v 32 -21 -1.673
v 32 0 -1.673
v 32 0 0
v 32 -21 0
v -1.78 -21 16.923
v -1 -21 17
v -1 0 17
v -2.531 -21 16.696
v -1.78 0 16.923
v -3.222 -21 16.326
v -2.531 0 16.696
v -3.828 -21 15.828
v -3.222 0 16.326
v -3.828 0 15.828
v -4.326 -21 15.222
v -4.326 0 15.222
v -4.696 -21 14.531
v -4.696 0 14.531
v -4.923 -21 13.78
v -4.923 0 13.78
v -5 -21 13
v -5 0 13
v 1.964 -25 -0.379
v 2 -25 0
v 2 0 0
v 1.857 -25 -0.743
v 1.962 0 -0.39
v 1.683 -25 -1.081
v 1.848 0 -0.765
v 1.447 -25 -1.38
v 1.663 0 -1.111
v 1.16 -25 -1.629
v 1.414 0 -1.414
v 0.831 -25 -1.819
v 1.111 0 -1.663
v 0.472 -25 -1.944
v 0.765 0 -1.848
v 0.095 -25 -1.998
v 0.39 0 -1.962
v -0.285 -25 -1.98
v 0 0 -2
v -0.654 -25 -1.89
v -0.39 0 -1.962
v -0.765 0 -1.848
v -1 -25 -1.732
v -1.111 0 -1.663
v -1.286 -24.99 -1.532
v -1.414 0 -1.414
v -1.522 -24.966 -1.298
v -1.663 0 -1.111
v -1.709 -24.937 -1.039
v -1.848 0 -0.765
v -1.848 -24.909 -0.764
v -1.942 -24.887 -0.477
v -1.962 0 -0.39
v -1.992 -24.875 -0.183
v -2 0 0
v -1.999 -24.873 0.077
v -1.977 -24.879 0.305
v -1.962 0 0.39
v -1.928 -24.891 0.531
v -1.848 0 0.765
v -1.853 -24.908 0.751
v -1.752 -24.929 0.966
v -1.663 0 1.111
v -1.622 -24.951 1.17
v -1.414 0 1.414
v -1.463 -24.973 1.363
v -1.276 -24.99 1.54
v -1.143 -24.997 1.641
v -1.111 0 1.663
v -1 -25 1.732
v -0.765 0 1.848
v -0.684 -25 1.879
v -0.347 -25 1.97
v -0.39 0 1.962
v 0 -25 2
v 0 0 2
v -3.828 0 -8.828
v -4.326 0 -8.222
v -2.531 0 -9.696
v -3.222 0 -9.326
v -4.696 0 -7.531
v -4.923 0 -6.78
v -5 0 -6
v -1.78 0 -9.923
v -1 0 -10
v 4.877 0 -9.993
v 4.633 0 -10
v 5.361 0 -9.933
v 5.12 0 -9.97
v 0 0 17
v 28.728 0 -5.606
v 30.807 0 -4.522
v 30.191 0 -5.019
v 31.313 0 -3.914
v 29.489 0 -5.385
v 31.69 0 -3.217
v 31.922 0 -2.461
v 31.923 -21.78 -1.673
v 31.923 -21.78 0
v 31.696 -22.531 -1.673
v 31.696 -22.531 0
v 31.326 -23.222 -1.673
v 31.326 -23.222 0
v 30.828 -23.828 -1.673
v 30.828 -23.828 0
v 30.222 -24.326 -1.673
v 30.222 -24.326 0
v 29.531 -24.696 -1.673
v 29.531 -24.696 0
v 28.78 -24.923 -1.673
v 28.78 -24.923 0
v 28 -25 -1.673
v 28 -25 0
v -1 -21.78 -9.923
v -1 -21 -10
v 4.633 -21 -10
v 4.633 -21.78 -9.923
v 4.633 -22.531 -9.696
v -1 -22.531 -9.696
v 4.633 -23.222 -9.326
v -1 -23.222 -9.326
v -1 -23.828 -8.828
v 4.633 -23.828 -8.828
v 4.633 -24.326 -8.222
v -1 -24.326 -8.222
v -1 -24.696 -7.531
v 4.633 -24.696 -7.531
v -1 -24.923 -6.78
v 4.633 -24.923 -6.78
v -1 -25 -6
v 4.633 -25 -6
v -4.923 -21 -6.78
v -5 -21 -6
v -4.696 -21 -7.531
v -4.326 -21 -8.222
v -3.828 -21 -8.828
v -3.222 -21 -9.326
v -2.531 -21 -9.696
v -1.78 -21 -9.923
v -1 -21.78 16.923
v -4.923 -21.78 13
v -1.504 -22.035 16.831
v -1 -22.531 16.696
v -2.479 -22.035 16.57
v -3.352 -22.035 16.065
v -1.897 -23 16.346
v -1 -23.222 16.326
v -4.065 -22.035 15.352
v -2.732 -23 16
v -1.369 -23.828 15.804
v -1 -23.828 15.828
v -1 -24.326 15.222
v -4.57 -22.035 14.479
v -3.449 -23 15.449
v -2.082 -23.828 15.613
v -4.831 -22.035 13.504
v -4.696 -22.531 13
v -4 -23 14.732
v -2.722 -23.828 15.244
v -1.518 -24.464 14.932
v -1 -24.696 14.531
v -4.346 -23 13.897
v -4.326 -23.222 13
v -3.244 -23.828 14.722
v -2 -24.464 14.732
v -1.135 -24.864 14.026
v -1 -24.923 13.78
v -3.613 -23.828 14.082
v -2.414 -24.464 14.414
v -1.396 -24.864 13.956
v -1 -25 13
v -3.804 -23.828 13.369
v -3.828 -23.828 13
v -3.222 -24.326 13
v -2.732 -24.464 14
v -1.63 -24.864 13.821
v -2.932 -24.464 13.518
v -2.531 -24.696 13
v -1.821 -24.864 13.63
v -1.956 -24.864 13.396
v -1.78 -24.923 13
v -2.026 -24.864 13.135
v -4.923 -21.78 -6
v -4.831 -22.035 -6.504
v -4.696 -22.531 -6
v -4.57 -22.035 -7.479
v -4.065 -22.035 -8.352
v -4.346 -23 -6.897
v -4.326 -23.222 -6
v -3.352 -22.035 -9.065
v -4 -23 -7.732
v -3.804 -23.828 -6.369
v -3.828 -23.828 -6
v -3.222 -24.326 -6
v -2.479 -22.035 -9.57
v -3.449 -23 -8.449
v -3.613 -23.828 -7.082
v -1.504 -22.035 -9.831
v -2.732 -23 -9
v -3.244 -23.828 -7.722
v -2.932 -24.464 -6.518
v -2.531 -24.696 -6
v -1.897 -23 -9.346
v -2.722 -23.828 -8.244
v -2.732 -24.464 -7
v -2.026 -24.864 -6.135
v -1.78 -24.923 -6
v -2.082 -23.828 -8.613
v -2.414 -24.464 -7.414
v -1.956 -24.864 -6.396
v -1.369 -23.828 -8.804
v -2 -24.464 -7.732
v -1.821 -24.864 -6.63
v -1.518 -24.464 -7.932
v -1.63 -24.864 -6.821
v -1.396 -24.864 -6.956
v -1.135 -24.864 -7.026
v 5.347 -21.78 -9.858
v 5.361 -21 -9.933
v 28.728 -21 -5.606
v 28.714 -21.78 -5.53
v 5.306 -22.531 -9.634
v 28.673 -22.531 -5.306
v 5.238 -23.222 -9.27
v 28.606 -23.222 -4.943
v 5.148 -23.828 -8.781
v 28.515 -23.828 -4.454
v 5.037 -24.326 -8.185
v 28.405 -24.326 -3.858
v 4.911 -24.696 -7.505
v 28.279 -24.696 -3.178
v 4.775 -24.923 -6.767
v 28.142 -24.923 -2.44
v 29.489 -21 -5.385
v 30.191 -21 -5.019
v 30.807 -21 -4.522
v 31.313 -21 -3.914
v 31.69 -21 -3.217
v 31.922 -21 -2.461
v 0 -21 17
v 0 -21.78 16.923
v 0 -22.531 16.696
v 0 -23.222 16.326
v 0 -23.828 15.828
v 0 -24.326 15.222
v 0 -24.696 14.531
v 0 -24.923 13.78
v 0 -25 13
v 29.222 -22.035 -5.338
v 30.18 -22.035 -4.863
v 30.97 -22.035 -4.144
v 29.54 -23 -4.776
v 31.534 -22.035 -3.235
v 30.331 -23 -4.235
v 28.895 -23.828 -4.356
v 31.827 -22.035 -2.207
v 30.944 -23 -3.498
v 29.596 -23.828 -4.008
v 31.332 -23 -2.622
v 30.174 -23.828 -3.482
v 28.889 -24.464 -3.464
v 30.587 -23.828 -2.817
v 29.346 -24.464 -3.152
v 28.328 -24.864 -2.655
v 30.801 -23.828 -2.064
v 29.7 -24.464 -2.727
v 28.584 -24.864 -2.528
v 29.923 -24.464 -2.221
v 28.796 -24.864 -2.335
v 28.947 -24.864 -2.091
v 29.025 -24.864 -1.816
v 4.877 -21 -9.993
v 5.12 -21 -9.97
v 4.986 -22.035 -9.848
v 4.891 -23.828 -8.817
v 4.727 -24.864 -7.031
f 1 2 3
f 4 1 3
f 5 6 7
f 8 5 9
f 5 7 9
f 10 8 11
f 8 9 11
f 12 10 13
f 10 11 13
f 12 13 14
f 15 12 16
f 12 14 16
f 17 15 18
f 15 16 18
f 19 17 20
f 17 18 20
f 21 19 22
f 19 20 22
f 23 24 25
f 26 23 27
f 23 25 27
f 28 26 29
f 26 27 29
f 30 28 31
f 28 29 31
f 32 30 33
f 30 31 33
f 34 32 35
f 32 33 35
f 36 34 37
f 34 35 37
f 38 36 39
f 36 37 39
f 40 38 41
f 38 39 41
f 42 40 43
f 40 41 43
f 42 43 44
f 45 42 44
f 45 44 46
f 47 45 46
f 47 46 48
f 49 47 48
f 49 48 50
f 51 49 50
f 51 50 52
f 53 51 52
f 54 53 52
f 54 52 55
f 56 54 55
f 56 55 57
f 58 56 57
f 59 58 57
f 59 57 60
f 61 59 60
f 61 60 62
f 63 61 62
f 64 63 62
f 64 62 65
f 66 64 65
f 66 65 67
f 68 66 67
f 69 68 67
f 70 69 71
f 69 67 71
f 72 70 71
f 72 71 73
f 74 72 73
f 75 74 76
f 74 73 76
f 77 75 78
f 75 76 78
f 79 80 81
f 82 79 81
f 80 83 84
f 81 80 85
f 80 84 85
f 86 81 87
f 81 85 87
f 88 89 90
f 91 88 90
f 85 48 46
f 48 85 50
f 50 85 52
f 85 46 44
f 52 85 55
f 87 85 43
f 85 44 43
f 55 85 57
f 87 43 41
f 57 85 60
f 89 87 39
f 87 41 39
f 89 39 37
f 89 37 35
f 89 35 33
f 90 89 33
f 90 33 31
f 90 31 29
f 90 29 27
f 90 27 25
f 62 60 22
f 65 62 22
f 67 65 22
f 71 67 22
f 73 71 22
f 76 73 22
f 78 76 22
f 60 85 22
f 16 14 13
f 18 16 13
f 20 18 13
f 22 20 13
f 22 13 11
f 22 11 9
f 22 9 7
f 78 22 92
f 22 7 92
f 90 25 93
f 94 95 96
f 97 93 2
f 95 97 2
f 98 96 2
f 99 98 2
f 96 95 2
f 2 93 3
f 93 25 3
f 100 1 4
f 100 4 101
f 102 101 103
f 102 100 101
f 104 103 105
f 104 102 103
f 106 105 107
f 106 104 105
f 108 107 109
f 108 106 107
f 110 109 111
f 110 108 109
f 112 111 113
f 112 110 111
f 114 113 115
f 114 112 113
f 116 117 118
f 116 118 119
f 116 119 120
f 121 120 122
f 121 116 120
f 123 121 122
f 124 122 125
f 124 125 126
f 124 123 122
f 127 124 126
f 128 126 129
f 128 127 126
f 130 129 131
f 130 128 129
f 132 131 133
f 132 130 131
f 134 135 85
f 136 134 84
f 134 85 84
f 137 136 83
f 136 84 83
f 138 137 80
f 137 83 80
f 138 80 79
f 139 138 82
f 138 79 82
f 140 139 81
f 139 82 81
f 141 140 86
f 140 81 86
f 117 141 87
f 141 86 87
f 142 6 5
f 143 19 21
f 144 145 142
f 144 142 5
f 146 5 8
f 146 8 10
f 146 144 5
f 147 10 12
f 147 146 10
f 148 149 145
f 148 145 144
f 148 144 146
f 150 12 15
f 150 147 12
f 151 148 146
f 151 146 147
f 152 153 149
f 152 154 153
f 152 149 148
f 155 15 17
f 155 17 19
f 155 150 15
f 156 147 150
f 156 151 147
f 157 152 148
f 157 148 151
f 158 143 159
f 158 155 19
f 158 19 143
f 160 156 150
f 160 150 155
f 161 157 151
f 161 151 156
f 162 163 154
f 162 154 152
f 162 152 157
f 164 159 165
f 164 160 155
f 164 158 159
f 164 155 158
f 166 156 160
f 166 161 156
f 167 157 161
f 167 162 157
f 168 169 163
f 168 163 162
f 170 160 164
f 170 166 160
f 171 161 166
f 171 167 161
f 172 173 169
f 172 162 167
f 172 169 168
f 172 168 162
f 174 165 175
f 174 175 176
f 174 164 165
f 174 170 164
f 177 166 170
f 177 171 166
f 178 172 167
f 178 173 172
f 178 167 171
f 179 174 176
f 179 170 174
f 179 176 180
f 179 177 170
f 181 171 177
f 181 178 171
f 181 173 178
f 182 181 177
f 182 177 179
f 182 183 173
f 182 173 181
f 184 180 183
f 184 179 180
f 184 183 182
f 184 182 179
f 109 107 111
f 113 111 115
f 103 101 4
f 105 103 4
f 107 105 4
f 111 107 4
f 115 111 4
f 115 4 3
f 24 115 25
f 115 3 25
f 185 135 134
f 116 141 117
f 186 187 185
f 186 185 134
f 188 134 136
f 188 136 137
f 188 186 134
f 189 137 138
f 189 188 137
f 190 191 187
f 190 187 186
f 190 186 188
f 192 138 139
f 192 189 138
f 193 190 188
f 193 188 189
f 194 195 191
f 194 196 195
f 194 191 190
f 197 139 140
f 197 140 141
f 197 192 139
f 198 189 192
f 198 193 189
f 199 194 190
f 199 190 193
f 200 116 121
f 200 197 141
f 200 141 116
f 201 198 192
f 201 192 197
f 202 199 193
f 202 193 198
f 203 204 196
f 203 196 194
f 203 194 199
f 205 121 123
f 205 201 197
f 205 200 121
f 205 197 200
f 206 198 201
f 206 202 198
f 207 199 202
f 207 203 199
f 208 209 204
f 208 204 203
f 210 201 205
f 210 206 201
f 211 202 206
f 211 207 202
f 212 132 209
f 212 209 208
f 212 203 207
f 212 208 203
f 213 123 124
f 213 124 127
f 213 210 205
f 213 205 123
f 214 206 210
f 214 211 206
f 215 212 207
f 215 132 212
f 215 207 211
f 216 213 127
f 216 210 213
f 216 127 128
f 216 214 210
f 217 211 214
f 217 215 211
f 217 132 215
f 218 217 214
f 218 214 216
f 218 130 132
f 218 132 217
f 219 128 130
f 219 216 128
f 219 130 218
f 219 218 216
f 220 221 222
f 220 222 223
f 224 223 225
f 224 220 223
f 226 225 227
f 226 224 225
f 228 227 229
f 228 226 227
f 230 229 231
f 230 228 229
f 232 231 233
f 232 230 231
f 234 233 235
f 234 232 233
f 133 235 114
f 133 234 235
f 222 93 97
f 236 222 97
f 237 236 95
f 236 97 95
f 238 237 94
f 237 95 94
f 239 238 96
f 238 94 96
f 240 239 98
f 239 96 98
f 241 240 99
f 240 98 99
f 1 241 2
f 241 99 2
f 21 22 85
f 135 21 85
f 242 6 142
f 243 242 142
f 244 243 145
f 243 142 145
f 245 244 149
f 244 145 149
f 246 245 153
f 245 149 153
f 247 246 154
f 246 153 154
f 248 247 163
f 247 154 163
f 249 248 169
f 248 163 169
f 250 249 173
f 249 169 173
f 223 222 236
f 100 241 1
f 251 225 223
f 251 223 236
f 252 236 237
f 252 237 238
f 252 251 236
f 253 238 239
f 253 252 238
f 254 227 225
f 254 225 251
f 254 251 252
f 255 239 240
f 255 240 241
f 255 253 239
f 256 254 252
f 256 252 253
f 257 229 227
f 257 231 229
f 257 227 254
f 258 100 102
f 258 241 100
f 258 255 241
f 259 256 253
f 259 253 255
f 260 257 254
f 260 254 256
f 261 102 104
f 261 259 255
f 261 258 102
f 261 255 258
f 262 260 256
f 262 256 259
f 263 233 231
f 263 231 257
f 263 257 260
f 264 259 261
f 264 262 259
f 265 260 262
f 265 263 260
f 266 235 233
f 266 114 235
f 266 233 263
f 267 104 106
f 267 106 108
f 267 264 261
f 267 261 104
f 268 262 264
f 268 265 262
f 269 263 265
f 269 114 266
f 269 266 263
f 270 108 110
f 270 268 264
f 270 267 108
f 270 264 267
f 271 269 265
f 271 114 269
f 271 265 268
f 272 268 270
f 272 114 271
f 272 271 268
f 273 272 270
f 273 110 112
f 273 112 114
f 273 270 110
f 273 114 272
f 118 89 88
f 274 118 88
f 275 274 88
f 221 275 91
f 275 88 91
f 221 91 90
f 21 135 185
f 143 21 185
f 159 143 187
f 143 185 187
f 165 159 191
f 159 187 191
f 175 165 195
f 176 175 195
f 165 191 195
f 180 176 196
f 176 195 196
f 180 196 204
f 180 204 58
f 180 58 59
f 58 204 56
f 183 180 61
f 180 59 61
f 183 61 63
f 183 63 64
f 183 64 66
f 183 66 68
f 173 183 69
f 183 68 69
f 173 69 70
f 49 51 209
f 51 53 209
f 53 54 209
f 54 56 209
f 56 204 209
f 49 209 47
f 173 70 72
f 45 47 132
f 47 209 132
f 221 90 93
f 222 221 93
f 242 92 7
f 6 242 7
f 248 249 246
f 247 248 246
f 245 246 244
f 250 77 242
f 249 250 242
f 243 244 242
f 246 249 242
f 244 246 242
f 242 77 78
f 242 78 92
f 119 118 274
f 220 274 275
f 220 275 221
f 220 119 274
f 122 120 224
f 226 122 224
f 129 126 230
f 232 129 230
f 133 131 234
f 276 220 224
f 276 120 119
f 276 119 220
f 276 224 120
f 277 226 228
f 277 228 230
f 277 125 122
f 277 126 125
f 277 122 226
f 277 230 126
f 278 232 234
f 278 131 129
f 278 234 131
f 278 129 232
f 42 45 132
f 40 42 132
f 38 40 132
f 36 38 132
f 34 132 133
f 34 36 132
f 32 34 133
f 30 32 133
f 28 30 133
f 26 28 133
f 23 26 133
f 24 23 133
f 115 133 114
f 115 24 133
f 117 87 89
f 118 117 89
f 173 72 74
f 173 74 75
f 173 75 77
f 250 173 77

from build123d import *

# Parameters (mm, degrees)
F1_DEPTH     = 25
F2_T1_DEPTH  = 19
F2_T3_DEPTH  = 23.7645438744
F2_T5_DEPTH  = 11.6727317873
F2_T7_DEPTH  = 11
F2_T9_DEPTH  = 5.6327516516
F2_T12_ANGLE = 79.5085229877
F2_T14_ANGLE = 90
F2_T16_ANGLE = 90
F2_T18_ANGLE = 10.4914770123


# Not quite as in the source:
# - a fillet or chamfer that OpenCascade refuses, or shapes differently, is made with other operations: its cross-section is extruded or revolved along the edge and cut away or added


with BuildPart() as f1:
    # F0 (on Front) → F1 (new body)
    with BuildSketch(Plane.XZ):
        with BuildLine():
            Line((32, 0), (2, 0))
            ThreePointArc((2, 0), (-1.4142135624, -1.4142135624), (0, 2))
            Line((0, 2), (0, 17))
            Line((0, 17), (-1, 17))
            ThreePointArc((-1, 17), (-3.8284271247, 15.8284271247), (-5, 13))
            Line((-5, 13), (-5, -6))
            ThreePointArc((-5, -6), (-3.8284271247, -8.8284271247), (-1, -10))
            Line((-1, -10), (4.6327516516, -10))
            ThreePointArc((4.6327516516, -10), (4.9984618649, -9.9832469218), (5.3611086923, -9.9331280199))
            Line((5.3611086923, -9.9331280199), (28.7283570407, -5.6058598073))
            ThreePointArc((28.7283570407, -5.6058598073), (31.0751770813, -4.2307165251), (32, -1.6727317873))
            Line((32, -1.6727317873), (32, 0))
        make_face()
    extrude(amount=F1_DEPTH)

    # F2: fillet of radius 4 on 9 edges, made by hand

    # F2_s2 → F2_t1 (cut)
    with BuildSketch(Plane.XY.offset(-6)):
        with BuildLine():
            ThreePointArc((-5, -21), (-3.8284271247, -23.8284271247), (-1, -25))
            Line((-1, -25), (-5, -25))
            Line((-5, -25), (-5, -21))
        make_face()
    extrude(amount=F2_T1_DEPTH, mode=Mode.SUBTRACT)

    # F2_s4 → F2_t3 (cut)
    with BuildSketch(Plane(origin=(3.4048752706, 0, 0.6305324575), x_dir=(0, 1, 0), z_dir=(0.983282005, 0, 0.1820892602))):
        with BuildLine():
            ThreePointArc((-21, -10.7432663508), (-23.8284271247, -9.5716934755), (-25, -6.7432663508))
            Line((-25, -6.7432663508), (-25, -10.7432663508))
            Line((-25, -10.7432663508), (-21, -10.7432663508))
        make_face()
    extrude(amount=F2_T3_DEPTH, mode=Mode.SUBTRACT)

    # F2_s6 → F2_t5 (cut)
    with BuildSketch(Plane.XY.offset(-1.6727317873)):
        with BuildLine():
            ThreePointArc((32, -21), (30.8284271247, -23.8284271247), (28, -25))
            Line((28, -25), (32, -25))
            Line((32, -25), (32, -21))
        make_face()
    extrude(amount=F2_T5_DEPTH, mode=Mode.SUBTRACT)

    # F2_s8 → F2_t7 (cut)
    with BuildSketch(Plane.YZ.offset(-1)):
        with BuildLine():
            ThreePointArc((-21, 17), (-23.8284271247, 15.8284271247), (-25, 13))
            Line((-25, 13), (-25, 17))
            Line((-25, 17), (-21, 17))
        make_face()
    extrude(amount=F2_T7_DEPTH, mode=Mode.SUBTRACT)

    # F2_s10 → F2_t9 (cut)
    with BuildSketch(Plane.YZ.offset(-1)):
        with BuildLine():
            ThreePointArc((-21, -10), (-23.8284271247, -8.8284271247), (-25, -6))
            Line((-25, -6), (-25, -10))
            Line((-25, -10), (-21, -10))
        make_face()
    extrude(amount=F2_T9_DEPTH, mode=Mode.SUBTRACT)

    # F2_s11 → F2_t12 (revolve, cut)
    with BuildSketch(Plane(origin=(26.772123619, 0, 4.9578006702), x_dir=(0, 1, 0), z_dir=(-0.983282005, 0, -0.1820892602))):
        with BuildLine():
            ThreePointArc((-21, 10.7432663508), (-23.8284271247, 9.5716934755), (-25, 6.7432663508))
            Line((-25, 6.7432663508), (-25, 10.7432663508))
            Line((-25, 10.7432663508), (-21, 10.7432663508))
        make_face()
    revolve(axis=Axis((28, -25, -1.6727317873), (0, -1, 0)), revolution_arc=F2_T12_ANGLE, mode=Mode.SUBTRACT)

    # F2_s13 → F2_t14 (revolve, cut)
    with BuildSketch(Plane.YZ.offset(-1)):
        with BuildLine():
            ThreePointArc((-21, 17), (-23.8284271247, 15.8284271247), (-25, 13))
            Line((-25, 13), (-25, 17))
            Line((-25, 17), (-21, 17))
        make_face()
    revolve(axis=Axis((-1, -25, 13), (0, -1, 0)), revolution_arc=F2_T14_ANGLE, mode=Mode.SUBTRACT)

    # F2_s15 → F2_t16 (revolve, cut)
    with BuildSketch(Plane.XY.offset(-6)):
        with BuildLine():
            ThreePointArc((-5, -21), (-3.8284271247, -23.8284271247), (-1, -25))
            Line((-1, -25), (-5, -25))
            Line((-5, -25), (-5, -21))
        make_face()
    revolve(axis=Axis((-1, -25, -6), (0, -1, 0)), revolution_arc=F2_T16_ANGLE, mode=Mode.SUBTRACT)

    # F2_s17 → F2_t18 (revolve, cut)
    with BuildSketch(Plane.YZ.offset(4.6327516516)):
        with BuildLine():
            ThreePointArc((-21, -10), (-23.8284271247, -8.8284271247), (-25, -6))
            Line((-25, -6), (-25, -10))
            Line((-25, -10), (-21, -10))
        make_face()
    revolve(axis=Axis((4.6327516516, -25, -6), (0, -1, 0)), revolution_arc=F2_T18_ANGLE, mode=Mode.SUBTRACT)


solid = f1.part
